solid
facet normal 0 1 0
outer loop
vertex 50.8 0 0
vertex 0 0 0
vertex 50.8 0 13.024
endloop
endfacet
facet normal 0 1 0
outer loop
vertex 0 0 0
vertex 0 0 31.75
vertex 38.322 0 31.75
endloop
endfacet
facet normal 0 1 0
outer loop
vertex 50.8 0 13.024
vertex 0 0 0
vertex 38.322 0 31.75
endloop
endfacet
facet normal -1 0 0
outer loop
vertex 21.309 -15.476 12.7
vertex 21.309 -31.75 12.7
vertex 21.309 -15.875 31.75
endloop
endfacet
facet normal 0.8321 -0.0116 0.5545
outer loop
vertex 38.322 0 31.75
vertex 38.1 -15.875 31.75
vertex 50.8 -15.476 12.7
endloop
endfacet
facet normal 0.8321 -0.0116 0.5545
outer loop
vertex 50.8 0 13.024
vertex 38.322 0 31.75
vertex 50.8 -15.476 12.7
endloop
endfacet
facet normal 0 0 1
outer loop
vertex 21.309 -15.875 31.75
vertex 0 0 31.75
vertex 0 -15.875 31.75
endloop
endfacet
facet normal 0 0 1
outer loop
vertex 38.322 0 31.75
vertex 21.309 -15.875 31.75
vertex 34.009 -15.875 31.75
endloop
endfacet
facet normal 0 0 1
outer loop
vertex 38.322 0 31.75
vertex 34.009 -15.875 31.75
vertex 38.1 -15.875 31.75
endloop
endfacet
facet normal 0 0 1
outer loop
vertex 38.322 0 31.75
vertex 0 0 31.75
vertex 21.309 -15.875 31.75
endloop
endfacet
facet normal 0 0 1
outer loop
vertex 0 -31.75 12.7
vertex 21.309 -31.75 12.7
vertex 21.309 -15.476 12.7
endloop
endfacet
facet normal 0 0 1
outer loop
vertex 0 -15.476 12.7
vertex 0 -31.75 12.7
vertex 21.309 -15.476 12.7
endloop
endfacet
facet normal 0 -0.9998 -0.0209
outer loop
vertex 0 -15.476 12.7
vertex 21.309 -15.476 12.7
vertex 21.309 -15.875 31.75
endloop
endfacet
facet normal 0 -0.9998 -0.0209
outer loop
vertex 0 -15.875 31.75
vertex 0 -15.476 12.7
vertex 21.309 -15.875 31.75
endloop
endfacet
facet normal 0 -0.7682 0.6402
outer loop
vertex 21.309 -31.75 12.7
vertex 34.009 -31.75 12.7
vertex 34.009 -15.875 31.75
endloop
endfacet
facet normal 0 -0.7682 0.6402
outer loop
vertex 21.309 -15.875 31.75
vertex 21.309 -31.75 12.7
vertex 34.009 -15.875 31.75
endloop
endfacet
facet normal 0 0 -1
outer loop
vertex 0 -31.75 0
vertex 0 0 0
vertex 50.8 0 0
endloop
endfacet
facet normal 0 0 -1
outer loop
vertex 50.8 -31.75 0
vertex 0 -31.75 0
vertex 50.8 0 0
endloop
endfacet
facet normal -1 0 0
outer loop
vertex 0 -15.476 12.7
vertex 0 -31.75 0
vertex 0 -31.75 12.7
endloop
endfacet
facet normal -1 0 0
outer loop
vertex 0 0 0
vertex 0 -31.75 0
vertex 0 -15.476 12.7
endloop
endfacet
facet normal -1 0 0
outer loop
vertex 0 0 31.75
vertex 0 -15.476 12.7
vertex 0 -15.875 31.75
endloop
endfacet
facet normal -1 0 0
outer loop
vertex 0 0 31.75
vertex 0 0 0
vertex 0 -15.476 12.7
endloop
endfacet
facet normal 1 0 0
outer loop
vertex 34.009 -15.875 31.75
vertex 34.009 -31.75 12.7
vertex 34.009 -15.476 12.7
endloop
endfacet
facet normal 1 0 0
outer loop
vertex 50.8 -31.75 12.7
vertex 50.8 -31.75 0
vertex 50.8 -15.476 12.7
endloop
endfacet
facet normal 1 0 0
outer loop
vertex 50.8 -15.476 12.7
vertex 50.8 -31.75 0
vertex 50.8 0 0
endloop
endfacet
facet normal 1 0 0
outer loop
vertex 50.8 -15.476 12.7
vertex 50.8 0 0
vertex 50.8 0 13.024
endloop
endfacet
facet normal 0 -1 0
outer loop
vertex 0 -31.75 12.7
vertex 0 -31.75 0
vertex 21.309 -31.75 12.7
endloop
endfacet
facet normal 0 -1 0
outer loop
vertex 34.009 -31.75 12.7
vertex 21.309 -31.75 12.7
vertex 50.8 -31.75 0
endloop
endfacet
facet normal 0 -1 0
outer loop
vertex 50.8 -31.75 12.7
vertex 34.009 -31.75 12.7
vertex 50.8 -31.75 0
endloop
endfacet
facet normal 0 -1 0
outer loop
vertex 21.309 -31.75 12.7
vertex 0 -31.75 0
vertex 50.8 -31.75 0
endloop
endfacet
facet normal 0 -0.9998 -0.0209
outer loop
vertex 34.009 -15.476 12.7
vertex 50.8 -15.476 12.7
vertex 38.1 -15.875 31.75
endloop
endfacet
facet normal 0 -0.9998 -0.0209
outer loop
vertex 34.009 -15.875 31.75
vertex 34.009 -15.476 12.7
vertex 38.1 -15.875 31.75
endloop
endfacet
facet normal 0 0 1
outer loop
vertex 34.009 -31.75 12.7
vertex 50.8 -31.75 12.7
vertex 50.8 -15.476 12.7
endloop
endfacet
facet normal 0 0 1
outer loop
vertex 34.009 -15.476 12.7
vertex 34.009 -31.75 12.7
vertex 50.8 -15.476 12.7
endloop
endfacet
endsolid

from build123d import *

# Parameters (mm, degrees)
F0_W      = 50.8
F0_H      = 31.75
F1_DEPTH  = 31.75
F3_DEPTH  = 50.8
F5_DEPTH  = 50.8
F7_DEPTH  = 25.4
F8_W      = 12.7
F8_H      = 16.2741773874
F9_DEPTH  = 19.05
F11_DEPTH = 25.4


with BuildPart() as f1:
    # F0 (on Front) → F1 (new body)
    with BuildSketch(Plane.XZ):
        with Locations((25.4, 15.875)):
            Rectangle(F0_W, F0_H)
    extrude(amount=F1_DEPTH)

    # F2 (on face) → F3 (cut)
    with BuildSketch(Plane.YZ.offset(50.8)):
        Polygon((-31.75, 31.75), (-31.75, 12.7), (-15.875, 31.75), align=None)
    extrude(amount=-F3_DEPTH, mode=Mode.SUBTRACT)

    # F4 (on face) → F5 (cut)
    with BuildSketch(Plane.YZ.offset(50.8)):
        Polygon((-15.875, 31.75), (-31.75, 12.7), (-15.4758226126, 12.7), align=None)
    extrude(amount=-F5_DEPTH, mode=Mode.SUBTRACT)

    # F6 (on face) → F7 (cut)
    with BuildSketch(Plane(origin=(0, -15.2030290354, -0.3185672131), x_dir=(1, 0, 0), z_dir=(0, -0.9997805332, -0.0209495948))):
        Polygon((38.1, 32.0756067453), (50.8, 13.0214249842), (50.8, 32.0756067453), align=None)
    extrude(amount=-F7_DEPTH, mode=Mode.SUBTRACT)

    # F8 (on face) → F9 (join)
    with BuildSketch(Plane.XY.offset(12.7)):
        with Locations((27.659196949, -23.6129113063)):
            Rectangle(F8_W, F8_H)
    extrude(amount=F9_DEPTH)

    # F10 (on face) → F11 (cut)
    with BuildSketch(Plane.YZ.offset(34.009196949)):
        Polygon((-31.75, 12.7), (-15.875, 31.75), (-31.75, 31.75), align=None)
    extrude(amount=-F11_DEPTH, mode=Mode.SUBTRACT)


solid = f1.part
